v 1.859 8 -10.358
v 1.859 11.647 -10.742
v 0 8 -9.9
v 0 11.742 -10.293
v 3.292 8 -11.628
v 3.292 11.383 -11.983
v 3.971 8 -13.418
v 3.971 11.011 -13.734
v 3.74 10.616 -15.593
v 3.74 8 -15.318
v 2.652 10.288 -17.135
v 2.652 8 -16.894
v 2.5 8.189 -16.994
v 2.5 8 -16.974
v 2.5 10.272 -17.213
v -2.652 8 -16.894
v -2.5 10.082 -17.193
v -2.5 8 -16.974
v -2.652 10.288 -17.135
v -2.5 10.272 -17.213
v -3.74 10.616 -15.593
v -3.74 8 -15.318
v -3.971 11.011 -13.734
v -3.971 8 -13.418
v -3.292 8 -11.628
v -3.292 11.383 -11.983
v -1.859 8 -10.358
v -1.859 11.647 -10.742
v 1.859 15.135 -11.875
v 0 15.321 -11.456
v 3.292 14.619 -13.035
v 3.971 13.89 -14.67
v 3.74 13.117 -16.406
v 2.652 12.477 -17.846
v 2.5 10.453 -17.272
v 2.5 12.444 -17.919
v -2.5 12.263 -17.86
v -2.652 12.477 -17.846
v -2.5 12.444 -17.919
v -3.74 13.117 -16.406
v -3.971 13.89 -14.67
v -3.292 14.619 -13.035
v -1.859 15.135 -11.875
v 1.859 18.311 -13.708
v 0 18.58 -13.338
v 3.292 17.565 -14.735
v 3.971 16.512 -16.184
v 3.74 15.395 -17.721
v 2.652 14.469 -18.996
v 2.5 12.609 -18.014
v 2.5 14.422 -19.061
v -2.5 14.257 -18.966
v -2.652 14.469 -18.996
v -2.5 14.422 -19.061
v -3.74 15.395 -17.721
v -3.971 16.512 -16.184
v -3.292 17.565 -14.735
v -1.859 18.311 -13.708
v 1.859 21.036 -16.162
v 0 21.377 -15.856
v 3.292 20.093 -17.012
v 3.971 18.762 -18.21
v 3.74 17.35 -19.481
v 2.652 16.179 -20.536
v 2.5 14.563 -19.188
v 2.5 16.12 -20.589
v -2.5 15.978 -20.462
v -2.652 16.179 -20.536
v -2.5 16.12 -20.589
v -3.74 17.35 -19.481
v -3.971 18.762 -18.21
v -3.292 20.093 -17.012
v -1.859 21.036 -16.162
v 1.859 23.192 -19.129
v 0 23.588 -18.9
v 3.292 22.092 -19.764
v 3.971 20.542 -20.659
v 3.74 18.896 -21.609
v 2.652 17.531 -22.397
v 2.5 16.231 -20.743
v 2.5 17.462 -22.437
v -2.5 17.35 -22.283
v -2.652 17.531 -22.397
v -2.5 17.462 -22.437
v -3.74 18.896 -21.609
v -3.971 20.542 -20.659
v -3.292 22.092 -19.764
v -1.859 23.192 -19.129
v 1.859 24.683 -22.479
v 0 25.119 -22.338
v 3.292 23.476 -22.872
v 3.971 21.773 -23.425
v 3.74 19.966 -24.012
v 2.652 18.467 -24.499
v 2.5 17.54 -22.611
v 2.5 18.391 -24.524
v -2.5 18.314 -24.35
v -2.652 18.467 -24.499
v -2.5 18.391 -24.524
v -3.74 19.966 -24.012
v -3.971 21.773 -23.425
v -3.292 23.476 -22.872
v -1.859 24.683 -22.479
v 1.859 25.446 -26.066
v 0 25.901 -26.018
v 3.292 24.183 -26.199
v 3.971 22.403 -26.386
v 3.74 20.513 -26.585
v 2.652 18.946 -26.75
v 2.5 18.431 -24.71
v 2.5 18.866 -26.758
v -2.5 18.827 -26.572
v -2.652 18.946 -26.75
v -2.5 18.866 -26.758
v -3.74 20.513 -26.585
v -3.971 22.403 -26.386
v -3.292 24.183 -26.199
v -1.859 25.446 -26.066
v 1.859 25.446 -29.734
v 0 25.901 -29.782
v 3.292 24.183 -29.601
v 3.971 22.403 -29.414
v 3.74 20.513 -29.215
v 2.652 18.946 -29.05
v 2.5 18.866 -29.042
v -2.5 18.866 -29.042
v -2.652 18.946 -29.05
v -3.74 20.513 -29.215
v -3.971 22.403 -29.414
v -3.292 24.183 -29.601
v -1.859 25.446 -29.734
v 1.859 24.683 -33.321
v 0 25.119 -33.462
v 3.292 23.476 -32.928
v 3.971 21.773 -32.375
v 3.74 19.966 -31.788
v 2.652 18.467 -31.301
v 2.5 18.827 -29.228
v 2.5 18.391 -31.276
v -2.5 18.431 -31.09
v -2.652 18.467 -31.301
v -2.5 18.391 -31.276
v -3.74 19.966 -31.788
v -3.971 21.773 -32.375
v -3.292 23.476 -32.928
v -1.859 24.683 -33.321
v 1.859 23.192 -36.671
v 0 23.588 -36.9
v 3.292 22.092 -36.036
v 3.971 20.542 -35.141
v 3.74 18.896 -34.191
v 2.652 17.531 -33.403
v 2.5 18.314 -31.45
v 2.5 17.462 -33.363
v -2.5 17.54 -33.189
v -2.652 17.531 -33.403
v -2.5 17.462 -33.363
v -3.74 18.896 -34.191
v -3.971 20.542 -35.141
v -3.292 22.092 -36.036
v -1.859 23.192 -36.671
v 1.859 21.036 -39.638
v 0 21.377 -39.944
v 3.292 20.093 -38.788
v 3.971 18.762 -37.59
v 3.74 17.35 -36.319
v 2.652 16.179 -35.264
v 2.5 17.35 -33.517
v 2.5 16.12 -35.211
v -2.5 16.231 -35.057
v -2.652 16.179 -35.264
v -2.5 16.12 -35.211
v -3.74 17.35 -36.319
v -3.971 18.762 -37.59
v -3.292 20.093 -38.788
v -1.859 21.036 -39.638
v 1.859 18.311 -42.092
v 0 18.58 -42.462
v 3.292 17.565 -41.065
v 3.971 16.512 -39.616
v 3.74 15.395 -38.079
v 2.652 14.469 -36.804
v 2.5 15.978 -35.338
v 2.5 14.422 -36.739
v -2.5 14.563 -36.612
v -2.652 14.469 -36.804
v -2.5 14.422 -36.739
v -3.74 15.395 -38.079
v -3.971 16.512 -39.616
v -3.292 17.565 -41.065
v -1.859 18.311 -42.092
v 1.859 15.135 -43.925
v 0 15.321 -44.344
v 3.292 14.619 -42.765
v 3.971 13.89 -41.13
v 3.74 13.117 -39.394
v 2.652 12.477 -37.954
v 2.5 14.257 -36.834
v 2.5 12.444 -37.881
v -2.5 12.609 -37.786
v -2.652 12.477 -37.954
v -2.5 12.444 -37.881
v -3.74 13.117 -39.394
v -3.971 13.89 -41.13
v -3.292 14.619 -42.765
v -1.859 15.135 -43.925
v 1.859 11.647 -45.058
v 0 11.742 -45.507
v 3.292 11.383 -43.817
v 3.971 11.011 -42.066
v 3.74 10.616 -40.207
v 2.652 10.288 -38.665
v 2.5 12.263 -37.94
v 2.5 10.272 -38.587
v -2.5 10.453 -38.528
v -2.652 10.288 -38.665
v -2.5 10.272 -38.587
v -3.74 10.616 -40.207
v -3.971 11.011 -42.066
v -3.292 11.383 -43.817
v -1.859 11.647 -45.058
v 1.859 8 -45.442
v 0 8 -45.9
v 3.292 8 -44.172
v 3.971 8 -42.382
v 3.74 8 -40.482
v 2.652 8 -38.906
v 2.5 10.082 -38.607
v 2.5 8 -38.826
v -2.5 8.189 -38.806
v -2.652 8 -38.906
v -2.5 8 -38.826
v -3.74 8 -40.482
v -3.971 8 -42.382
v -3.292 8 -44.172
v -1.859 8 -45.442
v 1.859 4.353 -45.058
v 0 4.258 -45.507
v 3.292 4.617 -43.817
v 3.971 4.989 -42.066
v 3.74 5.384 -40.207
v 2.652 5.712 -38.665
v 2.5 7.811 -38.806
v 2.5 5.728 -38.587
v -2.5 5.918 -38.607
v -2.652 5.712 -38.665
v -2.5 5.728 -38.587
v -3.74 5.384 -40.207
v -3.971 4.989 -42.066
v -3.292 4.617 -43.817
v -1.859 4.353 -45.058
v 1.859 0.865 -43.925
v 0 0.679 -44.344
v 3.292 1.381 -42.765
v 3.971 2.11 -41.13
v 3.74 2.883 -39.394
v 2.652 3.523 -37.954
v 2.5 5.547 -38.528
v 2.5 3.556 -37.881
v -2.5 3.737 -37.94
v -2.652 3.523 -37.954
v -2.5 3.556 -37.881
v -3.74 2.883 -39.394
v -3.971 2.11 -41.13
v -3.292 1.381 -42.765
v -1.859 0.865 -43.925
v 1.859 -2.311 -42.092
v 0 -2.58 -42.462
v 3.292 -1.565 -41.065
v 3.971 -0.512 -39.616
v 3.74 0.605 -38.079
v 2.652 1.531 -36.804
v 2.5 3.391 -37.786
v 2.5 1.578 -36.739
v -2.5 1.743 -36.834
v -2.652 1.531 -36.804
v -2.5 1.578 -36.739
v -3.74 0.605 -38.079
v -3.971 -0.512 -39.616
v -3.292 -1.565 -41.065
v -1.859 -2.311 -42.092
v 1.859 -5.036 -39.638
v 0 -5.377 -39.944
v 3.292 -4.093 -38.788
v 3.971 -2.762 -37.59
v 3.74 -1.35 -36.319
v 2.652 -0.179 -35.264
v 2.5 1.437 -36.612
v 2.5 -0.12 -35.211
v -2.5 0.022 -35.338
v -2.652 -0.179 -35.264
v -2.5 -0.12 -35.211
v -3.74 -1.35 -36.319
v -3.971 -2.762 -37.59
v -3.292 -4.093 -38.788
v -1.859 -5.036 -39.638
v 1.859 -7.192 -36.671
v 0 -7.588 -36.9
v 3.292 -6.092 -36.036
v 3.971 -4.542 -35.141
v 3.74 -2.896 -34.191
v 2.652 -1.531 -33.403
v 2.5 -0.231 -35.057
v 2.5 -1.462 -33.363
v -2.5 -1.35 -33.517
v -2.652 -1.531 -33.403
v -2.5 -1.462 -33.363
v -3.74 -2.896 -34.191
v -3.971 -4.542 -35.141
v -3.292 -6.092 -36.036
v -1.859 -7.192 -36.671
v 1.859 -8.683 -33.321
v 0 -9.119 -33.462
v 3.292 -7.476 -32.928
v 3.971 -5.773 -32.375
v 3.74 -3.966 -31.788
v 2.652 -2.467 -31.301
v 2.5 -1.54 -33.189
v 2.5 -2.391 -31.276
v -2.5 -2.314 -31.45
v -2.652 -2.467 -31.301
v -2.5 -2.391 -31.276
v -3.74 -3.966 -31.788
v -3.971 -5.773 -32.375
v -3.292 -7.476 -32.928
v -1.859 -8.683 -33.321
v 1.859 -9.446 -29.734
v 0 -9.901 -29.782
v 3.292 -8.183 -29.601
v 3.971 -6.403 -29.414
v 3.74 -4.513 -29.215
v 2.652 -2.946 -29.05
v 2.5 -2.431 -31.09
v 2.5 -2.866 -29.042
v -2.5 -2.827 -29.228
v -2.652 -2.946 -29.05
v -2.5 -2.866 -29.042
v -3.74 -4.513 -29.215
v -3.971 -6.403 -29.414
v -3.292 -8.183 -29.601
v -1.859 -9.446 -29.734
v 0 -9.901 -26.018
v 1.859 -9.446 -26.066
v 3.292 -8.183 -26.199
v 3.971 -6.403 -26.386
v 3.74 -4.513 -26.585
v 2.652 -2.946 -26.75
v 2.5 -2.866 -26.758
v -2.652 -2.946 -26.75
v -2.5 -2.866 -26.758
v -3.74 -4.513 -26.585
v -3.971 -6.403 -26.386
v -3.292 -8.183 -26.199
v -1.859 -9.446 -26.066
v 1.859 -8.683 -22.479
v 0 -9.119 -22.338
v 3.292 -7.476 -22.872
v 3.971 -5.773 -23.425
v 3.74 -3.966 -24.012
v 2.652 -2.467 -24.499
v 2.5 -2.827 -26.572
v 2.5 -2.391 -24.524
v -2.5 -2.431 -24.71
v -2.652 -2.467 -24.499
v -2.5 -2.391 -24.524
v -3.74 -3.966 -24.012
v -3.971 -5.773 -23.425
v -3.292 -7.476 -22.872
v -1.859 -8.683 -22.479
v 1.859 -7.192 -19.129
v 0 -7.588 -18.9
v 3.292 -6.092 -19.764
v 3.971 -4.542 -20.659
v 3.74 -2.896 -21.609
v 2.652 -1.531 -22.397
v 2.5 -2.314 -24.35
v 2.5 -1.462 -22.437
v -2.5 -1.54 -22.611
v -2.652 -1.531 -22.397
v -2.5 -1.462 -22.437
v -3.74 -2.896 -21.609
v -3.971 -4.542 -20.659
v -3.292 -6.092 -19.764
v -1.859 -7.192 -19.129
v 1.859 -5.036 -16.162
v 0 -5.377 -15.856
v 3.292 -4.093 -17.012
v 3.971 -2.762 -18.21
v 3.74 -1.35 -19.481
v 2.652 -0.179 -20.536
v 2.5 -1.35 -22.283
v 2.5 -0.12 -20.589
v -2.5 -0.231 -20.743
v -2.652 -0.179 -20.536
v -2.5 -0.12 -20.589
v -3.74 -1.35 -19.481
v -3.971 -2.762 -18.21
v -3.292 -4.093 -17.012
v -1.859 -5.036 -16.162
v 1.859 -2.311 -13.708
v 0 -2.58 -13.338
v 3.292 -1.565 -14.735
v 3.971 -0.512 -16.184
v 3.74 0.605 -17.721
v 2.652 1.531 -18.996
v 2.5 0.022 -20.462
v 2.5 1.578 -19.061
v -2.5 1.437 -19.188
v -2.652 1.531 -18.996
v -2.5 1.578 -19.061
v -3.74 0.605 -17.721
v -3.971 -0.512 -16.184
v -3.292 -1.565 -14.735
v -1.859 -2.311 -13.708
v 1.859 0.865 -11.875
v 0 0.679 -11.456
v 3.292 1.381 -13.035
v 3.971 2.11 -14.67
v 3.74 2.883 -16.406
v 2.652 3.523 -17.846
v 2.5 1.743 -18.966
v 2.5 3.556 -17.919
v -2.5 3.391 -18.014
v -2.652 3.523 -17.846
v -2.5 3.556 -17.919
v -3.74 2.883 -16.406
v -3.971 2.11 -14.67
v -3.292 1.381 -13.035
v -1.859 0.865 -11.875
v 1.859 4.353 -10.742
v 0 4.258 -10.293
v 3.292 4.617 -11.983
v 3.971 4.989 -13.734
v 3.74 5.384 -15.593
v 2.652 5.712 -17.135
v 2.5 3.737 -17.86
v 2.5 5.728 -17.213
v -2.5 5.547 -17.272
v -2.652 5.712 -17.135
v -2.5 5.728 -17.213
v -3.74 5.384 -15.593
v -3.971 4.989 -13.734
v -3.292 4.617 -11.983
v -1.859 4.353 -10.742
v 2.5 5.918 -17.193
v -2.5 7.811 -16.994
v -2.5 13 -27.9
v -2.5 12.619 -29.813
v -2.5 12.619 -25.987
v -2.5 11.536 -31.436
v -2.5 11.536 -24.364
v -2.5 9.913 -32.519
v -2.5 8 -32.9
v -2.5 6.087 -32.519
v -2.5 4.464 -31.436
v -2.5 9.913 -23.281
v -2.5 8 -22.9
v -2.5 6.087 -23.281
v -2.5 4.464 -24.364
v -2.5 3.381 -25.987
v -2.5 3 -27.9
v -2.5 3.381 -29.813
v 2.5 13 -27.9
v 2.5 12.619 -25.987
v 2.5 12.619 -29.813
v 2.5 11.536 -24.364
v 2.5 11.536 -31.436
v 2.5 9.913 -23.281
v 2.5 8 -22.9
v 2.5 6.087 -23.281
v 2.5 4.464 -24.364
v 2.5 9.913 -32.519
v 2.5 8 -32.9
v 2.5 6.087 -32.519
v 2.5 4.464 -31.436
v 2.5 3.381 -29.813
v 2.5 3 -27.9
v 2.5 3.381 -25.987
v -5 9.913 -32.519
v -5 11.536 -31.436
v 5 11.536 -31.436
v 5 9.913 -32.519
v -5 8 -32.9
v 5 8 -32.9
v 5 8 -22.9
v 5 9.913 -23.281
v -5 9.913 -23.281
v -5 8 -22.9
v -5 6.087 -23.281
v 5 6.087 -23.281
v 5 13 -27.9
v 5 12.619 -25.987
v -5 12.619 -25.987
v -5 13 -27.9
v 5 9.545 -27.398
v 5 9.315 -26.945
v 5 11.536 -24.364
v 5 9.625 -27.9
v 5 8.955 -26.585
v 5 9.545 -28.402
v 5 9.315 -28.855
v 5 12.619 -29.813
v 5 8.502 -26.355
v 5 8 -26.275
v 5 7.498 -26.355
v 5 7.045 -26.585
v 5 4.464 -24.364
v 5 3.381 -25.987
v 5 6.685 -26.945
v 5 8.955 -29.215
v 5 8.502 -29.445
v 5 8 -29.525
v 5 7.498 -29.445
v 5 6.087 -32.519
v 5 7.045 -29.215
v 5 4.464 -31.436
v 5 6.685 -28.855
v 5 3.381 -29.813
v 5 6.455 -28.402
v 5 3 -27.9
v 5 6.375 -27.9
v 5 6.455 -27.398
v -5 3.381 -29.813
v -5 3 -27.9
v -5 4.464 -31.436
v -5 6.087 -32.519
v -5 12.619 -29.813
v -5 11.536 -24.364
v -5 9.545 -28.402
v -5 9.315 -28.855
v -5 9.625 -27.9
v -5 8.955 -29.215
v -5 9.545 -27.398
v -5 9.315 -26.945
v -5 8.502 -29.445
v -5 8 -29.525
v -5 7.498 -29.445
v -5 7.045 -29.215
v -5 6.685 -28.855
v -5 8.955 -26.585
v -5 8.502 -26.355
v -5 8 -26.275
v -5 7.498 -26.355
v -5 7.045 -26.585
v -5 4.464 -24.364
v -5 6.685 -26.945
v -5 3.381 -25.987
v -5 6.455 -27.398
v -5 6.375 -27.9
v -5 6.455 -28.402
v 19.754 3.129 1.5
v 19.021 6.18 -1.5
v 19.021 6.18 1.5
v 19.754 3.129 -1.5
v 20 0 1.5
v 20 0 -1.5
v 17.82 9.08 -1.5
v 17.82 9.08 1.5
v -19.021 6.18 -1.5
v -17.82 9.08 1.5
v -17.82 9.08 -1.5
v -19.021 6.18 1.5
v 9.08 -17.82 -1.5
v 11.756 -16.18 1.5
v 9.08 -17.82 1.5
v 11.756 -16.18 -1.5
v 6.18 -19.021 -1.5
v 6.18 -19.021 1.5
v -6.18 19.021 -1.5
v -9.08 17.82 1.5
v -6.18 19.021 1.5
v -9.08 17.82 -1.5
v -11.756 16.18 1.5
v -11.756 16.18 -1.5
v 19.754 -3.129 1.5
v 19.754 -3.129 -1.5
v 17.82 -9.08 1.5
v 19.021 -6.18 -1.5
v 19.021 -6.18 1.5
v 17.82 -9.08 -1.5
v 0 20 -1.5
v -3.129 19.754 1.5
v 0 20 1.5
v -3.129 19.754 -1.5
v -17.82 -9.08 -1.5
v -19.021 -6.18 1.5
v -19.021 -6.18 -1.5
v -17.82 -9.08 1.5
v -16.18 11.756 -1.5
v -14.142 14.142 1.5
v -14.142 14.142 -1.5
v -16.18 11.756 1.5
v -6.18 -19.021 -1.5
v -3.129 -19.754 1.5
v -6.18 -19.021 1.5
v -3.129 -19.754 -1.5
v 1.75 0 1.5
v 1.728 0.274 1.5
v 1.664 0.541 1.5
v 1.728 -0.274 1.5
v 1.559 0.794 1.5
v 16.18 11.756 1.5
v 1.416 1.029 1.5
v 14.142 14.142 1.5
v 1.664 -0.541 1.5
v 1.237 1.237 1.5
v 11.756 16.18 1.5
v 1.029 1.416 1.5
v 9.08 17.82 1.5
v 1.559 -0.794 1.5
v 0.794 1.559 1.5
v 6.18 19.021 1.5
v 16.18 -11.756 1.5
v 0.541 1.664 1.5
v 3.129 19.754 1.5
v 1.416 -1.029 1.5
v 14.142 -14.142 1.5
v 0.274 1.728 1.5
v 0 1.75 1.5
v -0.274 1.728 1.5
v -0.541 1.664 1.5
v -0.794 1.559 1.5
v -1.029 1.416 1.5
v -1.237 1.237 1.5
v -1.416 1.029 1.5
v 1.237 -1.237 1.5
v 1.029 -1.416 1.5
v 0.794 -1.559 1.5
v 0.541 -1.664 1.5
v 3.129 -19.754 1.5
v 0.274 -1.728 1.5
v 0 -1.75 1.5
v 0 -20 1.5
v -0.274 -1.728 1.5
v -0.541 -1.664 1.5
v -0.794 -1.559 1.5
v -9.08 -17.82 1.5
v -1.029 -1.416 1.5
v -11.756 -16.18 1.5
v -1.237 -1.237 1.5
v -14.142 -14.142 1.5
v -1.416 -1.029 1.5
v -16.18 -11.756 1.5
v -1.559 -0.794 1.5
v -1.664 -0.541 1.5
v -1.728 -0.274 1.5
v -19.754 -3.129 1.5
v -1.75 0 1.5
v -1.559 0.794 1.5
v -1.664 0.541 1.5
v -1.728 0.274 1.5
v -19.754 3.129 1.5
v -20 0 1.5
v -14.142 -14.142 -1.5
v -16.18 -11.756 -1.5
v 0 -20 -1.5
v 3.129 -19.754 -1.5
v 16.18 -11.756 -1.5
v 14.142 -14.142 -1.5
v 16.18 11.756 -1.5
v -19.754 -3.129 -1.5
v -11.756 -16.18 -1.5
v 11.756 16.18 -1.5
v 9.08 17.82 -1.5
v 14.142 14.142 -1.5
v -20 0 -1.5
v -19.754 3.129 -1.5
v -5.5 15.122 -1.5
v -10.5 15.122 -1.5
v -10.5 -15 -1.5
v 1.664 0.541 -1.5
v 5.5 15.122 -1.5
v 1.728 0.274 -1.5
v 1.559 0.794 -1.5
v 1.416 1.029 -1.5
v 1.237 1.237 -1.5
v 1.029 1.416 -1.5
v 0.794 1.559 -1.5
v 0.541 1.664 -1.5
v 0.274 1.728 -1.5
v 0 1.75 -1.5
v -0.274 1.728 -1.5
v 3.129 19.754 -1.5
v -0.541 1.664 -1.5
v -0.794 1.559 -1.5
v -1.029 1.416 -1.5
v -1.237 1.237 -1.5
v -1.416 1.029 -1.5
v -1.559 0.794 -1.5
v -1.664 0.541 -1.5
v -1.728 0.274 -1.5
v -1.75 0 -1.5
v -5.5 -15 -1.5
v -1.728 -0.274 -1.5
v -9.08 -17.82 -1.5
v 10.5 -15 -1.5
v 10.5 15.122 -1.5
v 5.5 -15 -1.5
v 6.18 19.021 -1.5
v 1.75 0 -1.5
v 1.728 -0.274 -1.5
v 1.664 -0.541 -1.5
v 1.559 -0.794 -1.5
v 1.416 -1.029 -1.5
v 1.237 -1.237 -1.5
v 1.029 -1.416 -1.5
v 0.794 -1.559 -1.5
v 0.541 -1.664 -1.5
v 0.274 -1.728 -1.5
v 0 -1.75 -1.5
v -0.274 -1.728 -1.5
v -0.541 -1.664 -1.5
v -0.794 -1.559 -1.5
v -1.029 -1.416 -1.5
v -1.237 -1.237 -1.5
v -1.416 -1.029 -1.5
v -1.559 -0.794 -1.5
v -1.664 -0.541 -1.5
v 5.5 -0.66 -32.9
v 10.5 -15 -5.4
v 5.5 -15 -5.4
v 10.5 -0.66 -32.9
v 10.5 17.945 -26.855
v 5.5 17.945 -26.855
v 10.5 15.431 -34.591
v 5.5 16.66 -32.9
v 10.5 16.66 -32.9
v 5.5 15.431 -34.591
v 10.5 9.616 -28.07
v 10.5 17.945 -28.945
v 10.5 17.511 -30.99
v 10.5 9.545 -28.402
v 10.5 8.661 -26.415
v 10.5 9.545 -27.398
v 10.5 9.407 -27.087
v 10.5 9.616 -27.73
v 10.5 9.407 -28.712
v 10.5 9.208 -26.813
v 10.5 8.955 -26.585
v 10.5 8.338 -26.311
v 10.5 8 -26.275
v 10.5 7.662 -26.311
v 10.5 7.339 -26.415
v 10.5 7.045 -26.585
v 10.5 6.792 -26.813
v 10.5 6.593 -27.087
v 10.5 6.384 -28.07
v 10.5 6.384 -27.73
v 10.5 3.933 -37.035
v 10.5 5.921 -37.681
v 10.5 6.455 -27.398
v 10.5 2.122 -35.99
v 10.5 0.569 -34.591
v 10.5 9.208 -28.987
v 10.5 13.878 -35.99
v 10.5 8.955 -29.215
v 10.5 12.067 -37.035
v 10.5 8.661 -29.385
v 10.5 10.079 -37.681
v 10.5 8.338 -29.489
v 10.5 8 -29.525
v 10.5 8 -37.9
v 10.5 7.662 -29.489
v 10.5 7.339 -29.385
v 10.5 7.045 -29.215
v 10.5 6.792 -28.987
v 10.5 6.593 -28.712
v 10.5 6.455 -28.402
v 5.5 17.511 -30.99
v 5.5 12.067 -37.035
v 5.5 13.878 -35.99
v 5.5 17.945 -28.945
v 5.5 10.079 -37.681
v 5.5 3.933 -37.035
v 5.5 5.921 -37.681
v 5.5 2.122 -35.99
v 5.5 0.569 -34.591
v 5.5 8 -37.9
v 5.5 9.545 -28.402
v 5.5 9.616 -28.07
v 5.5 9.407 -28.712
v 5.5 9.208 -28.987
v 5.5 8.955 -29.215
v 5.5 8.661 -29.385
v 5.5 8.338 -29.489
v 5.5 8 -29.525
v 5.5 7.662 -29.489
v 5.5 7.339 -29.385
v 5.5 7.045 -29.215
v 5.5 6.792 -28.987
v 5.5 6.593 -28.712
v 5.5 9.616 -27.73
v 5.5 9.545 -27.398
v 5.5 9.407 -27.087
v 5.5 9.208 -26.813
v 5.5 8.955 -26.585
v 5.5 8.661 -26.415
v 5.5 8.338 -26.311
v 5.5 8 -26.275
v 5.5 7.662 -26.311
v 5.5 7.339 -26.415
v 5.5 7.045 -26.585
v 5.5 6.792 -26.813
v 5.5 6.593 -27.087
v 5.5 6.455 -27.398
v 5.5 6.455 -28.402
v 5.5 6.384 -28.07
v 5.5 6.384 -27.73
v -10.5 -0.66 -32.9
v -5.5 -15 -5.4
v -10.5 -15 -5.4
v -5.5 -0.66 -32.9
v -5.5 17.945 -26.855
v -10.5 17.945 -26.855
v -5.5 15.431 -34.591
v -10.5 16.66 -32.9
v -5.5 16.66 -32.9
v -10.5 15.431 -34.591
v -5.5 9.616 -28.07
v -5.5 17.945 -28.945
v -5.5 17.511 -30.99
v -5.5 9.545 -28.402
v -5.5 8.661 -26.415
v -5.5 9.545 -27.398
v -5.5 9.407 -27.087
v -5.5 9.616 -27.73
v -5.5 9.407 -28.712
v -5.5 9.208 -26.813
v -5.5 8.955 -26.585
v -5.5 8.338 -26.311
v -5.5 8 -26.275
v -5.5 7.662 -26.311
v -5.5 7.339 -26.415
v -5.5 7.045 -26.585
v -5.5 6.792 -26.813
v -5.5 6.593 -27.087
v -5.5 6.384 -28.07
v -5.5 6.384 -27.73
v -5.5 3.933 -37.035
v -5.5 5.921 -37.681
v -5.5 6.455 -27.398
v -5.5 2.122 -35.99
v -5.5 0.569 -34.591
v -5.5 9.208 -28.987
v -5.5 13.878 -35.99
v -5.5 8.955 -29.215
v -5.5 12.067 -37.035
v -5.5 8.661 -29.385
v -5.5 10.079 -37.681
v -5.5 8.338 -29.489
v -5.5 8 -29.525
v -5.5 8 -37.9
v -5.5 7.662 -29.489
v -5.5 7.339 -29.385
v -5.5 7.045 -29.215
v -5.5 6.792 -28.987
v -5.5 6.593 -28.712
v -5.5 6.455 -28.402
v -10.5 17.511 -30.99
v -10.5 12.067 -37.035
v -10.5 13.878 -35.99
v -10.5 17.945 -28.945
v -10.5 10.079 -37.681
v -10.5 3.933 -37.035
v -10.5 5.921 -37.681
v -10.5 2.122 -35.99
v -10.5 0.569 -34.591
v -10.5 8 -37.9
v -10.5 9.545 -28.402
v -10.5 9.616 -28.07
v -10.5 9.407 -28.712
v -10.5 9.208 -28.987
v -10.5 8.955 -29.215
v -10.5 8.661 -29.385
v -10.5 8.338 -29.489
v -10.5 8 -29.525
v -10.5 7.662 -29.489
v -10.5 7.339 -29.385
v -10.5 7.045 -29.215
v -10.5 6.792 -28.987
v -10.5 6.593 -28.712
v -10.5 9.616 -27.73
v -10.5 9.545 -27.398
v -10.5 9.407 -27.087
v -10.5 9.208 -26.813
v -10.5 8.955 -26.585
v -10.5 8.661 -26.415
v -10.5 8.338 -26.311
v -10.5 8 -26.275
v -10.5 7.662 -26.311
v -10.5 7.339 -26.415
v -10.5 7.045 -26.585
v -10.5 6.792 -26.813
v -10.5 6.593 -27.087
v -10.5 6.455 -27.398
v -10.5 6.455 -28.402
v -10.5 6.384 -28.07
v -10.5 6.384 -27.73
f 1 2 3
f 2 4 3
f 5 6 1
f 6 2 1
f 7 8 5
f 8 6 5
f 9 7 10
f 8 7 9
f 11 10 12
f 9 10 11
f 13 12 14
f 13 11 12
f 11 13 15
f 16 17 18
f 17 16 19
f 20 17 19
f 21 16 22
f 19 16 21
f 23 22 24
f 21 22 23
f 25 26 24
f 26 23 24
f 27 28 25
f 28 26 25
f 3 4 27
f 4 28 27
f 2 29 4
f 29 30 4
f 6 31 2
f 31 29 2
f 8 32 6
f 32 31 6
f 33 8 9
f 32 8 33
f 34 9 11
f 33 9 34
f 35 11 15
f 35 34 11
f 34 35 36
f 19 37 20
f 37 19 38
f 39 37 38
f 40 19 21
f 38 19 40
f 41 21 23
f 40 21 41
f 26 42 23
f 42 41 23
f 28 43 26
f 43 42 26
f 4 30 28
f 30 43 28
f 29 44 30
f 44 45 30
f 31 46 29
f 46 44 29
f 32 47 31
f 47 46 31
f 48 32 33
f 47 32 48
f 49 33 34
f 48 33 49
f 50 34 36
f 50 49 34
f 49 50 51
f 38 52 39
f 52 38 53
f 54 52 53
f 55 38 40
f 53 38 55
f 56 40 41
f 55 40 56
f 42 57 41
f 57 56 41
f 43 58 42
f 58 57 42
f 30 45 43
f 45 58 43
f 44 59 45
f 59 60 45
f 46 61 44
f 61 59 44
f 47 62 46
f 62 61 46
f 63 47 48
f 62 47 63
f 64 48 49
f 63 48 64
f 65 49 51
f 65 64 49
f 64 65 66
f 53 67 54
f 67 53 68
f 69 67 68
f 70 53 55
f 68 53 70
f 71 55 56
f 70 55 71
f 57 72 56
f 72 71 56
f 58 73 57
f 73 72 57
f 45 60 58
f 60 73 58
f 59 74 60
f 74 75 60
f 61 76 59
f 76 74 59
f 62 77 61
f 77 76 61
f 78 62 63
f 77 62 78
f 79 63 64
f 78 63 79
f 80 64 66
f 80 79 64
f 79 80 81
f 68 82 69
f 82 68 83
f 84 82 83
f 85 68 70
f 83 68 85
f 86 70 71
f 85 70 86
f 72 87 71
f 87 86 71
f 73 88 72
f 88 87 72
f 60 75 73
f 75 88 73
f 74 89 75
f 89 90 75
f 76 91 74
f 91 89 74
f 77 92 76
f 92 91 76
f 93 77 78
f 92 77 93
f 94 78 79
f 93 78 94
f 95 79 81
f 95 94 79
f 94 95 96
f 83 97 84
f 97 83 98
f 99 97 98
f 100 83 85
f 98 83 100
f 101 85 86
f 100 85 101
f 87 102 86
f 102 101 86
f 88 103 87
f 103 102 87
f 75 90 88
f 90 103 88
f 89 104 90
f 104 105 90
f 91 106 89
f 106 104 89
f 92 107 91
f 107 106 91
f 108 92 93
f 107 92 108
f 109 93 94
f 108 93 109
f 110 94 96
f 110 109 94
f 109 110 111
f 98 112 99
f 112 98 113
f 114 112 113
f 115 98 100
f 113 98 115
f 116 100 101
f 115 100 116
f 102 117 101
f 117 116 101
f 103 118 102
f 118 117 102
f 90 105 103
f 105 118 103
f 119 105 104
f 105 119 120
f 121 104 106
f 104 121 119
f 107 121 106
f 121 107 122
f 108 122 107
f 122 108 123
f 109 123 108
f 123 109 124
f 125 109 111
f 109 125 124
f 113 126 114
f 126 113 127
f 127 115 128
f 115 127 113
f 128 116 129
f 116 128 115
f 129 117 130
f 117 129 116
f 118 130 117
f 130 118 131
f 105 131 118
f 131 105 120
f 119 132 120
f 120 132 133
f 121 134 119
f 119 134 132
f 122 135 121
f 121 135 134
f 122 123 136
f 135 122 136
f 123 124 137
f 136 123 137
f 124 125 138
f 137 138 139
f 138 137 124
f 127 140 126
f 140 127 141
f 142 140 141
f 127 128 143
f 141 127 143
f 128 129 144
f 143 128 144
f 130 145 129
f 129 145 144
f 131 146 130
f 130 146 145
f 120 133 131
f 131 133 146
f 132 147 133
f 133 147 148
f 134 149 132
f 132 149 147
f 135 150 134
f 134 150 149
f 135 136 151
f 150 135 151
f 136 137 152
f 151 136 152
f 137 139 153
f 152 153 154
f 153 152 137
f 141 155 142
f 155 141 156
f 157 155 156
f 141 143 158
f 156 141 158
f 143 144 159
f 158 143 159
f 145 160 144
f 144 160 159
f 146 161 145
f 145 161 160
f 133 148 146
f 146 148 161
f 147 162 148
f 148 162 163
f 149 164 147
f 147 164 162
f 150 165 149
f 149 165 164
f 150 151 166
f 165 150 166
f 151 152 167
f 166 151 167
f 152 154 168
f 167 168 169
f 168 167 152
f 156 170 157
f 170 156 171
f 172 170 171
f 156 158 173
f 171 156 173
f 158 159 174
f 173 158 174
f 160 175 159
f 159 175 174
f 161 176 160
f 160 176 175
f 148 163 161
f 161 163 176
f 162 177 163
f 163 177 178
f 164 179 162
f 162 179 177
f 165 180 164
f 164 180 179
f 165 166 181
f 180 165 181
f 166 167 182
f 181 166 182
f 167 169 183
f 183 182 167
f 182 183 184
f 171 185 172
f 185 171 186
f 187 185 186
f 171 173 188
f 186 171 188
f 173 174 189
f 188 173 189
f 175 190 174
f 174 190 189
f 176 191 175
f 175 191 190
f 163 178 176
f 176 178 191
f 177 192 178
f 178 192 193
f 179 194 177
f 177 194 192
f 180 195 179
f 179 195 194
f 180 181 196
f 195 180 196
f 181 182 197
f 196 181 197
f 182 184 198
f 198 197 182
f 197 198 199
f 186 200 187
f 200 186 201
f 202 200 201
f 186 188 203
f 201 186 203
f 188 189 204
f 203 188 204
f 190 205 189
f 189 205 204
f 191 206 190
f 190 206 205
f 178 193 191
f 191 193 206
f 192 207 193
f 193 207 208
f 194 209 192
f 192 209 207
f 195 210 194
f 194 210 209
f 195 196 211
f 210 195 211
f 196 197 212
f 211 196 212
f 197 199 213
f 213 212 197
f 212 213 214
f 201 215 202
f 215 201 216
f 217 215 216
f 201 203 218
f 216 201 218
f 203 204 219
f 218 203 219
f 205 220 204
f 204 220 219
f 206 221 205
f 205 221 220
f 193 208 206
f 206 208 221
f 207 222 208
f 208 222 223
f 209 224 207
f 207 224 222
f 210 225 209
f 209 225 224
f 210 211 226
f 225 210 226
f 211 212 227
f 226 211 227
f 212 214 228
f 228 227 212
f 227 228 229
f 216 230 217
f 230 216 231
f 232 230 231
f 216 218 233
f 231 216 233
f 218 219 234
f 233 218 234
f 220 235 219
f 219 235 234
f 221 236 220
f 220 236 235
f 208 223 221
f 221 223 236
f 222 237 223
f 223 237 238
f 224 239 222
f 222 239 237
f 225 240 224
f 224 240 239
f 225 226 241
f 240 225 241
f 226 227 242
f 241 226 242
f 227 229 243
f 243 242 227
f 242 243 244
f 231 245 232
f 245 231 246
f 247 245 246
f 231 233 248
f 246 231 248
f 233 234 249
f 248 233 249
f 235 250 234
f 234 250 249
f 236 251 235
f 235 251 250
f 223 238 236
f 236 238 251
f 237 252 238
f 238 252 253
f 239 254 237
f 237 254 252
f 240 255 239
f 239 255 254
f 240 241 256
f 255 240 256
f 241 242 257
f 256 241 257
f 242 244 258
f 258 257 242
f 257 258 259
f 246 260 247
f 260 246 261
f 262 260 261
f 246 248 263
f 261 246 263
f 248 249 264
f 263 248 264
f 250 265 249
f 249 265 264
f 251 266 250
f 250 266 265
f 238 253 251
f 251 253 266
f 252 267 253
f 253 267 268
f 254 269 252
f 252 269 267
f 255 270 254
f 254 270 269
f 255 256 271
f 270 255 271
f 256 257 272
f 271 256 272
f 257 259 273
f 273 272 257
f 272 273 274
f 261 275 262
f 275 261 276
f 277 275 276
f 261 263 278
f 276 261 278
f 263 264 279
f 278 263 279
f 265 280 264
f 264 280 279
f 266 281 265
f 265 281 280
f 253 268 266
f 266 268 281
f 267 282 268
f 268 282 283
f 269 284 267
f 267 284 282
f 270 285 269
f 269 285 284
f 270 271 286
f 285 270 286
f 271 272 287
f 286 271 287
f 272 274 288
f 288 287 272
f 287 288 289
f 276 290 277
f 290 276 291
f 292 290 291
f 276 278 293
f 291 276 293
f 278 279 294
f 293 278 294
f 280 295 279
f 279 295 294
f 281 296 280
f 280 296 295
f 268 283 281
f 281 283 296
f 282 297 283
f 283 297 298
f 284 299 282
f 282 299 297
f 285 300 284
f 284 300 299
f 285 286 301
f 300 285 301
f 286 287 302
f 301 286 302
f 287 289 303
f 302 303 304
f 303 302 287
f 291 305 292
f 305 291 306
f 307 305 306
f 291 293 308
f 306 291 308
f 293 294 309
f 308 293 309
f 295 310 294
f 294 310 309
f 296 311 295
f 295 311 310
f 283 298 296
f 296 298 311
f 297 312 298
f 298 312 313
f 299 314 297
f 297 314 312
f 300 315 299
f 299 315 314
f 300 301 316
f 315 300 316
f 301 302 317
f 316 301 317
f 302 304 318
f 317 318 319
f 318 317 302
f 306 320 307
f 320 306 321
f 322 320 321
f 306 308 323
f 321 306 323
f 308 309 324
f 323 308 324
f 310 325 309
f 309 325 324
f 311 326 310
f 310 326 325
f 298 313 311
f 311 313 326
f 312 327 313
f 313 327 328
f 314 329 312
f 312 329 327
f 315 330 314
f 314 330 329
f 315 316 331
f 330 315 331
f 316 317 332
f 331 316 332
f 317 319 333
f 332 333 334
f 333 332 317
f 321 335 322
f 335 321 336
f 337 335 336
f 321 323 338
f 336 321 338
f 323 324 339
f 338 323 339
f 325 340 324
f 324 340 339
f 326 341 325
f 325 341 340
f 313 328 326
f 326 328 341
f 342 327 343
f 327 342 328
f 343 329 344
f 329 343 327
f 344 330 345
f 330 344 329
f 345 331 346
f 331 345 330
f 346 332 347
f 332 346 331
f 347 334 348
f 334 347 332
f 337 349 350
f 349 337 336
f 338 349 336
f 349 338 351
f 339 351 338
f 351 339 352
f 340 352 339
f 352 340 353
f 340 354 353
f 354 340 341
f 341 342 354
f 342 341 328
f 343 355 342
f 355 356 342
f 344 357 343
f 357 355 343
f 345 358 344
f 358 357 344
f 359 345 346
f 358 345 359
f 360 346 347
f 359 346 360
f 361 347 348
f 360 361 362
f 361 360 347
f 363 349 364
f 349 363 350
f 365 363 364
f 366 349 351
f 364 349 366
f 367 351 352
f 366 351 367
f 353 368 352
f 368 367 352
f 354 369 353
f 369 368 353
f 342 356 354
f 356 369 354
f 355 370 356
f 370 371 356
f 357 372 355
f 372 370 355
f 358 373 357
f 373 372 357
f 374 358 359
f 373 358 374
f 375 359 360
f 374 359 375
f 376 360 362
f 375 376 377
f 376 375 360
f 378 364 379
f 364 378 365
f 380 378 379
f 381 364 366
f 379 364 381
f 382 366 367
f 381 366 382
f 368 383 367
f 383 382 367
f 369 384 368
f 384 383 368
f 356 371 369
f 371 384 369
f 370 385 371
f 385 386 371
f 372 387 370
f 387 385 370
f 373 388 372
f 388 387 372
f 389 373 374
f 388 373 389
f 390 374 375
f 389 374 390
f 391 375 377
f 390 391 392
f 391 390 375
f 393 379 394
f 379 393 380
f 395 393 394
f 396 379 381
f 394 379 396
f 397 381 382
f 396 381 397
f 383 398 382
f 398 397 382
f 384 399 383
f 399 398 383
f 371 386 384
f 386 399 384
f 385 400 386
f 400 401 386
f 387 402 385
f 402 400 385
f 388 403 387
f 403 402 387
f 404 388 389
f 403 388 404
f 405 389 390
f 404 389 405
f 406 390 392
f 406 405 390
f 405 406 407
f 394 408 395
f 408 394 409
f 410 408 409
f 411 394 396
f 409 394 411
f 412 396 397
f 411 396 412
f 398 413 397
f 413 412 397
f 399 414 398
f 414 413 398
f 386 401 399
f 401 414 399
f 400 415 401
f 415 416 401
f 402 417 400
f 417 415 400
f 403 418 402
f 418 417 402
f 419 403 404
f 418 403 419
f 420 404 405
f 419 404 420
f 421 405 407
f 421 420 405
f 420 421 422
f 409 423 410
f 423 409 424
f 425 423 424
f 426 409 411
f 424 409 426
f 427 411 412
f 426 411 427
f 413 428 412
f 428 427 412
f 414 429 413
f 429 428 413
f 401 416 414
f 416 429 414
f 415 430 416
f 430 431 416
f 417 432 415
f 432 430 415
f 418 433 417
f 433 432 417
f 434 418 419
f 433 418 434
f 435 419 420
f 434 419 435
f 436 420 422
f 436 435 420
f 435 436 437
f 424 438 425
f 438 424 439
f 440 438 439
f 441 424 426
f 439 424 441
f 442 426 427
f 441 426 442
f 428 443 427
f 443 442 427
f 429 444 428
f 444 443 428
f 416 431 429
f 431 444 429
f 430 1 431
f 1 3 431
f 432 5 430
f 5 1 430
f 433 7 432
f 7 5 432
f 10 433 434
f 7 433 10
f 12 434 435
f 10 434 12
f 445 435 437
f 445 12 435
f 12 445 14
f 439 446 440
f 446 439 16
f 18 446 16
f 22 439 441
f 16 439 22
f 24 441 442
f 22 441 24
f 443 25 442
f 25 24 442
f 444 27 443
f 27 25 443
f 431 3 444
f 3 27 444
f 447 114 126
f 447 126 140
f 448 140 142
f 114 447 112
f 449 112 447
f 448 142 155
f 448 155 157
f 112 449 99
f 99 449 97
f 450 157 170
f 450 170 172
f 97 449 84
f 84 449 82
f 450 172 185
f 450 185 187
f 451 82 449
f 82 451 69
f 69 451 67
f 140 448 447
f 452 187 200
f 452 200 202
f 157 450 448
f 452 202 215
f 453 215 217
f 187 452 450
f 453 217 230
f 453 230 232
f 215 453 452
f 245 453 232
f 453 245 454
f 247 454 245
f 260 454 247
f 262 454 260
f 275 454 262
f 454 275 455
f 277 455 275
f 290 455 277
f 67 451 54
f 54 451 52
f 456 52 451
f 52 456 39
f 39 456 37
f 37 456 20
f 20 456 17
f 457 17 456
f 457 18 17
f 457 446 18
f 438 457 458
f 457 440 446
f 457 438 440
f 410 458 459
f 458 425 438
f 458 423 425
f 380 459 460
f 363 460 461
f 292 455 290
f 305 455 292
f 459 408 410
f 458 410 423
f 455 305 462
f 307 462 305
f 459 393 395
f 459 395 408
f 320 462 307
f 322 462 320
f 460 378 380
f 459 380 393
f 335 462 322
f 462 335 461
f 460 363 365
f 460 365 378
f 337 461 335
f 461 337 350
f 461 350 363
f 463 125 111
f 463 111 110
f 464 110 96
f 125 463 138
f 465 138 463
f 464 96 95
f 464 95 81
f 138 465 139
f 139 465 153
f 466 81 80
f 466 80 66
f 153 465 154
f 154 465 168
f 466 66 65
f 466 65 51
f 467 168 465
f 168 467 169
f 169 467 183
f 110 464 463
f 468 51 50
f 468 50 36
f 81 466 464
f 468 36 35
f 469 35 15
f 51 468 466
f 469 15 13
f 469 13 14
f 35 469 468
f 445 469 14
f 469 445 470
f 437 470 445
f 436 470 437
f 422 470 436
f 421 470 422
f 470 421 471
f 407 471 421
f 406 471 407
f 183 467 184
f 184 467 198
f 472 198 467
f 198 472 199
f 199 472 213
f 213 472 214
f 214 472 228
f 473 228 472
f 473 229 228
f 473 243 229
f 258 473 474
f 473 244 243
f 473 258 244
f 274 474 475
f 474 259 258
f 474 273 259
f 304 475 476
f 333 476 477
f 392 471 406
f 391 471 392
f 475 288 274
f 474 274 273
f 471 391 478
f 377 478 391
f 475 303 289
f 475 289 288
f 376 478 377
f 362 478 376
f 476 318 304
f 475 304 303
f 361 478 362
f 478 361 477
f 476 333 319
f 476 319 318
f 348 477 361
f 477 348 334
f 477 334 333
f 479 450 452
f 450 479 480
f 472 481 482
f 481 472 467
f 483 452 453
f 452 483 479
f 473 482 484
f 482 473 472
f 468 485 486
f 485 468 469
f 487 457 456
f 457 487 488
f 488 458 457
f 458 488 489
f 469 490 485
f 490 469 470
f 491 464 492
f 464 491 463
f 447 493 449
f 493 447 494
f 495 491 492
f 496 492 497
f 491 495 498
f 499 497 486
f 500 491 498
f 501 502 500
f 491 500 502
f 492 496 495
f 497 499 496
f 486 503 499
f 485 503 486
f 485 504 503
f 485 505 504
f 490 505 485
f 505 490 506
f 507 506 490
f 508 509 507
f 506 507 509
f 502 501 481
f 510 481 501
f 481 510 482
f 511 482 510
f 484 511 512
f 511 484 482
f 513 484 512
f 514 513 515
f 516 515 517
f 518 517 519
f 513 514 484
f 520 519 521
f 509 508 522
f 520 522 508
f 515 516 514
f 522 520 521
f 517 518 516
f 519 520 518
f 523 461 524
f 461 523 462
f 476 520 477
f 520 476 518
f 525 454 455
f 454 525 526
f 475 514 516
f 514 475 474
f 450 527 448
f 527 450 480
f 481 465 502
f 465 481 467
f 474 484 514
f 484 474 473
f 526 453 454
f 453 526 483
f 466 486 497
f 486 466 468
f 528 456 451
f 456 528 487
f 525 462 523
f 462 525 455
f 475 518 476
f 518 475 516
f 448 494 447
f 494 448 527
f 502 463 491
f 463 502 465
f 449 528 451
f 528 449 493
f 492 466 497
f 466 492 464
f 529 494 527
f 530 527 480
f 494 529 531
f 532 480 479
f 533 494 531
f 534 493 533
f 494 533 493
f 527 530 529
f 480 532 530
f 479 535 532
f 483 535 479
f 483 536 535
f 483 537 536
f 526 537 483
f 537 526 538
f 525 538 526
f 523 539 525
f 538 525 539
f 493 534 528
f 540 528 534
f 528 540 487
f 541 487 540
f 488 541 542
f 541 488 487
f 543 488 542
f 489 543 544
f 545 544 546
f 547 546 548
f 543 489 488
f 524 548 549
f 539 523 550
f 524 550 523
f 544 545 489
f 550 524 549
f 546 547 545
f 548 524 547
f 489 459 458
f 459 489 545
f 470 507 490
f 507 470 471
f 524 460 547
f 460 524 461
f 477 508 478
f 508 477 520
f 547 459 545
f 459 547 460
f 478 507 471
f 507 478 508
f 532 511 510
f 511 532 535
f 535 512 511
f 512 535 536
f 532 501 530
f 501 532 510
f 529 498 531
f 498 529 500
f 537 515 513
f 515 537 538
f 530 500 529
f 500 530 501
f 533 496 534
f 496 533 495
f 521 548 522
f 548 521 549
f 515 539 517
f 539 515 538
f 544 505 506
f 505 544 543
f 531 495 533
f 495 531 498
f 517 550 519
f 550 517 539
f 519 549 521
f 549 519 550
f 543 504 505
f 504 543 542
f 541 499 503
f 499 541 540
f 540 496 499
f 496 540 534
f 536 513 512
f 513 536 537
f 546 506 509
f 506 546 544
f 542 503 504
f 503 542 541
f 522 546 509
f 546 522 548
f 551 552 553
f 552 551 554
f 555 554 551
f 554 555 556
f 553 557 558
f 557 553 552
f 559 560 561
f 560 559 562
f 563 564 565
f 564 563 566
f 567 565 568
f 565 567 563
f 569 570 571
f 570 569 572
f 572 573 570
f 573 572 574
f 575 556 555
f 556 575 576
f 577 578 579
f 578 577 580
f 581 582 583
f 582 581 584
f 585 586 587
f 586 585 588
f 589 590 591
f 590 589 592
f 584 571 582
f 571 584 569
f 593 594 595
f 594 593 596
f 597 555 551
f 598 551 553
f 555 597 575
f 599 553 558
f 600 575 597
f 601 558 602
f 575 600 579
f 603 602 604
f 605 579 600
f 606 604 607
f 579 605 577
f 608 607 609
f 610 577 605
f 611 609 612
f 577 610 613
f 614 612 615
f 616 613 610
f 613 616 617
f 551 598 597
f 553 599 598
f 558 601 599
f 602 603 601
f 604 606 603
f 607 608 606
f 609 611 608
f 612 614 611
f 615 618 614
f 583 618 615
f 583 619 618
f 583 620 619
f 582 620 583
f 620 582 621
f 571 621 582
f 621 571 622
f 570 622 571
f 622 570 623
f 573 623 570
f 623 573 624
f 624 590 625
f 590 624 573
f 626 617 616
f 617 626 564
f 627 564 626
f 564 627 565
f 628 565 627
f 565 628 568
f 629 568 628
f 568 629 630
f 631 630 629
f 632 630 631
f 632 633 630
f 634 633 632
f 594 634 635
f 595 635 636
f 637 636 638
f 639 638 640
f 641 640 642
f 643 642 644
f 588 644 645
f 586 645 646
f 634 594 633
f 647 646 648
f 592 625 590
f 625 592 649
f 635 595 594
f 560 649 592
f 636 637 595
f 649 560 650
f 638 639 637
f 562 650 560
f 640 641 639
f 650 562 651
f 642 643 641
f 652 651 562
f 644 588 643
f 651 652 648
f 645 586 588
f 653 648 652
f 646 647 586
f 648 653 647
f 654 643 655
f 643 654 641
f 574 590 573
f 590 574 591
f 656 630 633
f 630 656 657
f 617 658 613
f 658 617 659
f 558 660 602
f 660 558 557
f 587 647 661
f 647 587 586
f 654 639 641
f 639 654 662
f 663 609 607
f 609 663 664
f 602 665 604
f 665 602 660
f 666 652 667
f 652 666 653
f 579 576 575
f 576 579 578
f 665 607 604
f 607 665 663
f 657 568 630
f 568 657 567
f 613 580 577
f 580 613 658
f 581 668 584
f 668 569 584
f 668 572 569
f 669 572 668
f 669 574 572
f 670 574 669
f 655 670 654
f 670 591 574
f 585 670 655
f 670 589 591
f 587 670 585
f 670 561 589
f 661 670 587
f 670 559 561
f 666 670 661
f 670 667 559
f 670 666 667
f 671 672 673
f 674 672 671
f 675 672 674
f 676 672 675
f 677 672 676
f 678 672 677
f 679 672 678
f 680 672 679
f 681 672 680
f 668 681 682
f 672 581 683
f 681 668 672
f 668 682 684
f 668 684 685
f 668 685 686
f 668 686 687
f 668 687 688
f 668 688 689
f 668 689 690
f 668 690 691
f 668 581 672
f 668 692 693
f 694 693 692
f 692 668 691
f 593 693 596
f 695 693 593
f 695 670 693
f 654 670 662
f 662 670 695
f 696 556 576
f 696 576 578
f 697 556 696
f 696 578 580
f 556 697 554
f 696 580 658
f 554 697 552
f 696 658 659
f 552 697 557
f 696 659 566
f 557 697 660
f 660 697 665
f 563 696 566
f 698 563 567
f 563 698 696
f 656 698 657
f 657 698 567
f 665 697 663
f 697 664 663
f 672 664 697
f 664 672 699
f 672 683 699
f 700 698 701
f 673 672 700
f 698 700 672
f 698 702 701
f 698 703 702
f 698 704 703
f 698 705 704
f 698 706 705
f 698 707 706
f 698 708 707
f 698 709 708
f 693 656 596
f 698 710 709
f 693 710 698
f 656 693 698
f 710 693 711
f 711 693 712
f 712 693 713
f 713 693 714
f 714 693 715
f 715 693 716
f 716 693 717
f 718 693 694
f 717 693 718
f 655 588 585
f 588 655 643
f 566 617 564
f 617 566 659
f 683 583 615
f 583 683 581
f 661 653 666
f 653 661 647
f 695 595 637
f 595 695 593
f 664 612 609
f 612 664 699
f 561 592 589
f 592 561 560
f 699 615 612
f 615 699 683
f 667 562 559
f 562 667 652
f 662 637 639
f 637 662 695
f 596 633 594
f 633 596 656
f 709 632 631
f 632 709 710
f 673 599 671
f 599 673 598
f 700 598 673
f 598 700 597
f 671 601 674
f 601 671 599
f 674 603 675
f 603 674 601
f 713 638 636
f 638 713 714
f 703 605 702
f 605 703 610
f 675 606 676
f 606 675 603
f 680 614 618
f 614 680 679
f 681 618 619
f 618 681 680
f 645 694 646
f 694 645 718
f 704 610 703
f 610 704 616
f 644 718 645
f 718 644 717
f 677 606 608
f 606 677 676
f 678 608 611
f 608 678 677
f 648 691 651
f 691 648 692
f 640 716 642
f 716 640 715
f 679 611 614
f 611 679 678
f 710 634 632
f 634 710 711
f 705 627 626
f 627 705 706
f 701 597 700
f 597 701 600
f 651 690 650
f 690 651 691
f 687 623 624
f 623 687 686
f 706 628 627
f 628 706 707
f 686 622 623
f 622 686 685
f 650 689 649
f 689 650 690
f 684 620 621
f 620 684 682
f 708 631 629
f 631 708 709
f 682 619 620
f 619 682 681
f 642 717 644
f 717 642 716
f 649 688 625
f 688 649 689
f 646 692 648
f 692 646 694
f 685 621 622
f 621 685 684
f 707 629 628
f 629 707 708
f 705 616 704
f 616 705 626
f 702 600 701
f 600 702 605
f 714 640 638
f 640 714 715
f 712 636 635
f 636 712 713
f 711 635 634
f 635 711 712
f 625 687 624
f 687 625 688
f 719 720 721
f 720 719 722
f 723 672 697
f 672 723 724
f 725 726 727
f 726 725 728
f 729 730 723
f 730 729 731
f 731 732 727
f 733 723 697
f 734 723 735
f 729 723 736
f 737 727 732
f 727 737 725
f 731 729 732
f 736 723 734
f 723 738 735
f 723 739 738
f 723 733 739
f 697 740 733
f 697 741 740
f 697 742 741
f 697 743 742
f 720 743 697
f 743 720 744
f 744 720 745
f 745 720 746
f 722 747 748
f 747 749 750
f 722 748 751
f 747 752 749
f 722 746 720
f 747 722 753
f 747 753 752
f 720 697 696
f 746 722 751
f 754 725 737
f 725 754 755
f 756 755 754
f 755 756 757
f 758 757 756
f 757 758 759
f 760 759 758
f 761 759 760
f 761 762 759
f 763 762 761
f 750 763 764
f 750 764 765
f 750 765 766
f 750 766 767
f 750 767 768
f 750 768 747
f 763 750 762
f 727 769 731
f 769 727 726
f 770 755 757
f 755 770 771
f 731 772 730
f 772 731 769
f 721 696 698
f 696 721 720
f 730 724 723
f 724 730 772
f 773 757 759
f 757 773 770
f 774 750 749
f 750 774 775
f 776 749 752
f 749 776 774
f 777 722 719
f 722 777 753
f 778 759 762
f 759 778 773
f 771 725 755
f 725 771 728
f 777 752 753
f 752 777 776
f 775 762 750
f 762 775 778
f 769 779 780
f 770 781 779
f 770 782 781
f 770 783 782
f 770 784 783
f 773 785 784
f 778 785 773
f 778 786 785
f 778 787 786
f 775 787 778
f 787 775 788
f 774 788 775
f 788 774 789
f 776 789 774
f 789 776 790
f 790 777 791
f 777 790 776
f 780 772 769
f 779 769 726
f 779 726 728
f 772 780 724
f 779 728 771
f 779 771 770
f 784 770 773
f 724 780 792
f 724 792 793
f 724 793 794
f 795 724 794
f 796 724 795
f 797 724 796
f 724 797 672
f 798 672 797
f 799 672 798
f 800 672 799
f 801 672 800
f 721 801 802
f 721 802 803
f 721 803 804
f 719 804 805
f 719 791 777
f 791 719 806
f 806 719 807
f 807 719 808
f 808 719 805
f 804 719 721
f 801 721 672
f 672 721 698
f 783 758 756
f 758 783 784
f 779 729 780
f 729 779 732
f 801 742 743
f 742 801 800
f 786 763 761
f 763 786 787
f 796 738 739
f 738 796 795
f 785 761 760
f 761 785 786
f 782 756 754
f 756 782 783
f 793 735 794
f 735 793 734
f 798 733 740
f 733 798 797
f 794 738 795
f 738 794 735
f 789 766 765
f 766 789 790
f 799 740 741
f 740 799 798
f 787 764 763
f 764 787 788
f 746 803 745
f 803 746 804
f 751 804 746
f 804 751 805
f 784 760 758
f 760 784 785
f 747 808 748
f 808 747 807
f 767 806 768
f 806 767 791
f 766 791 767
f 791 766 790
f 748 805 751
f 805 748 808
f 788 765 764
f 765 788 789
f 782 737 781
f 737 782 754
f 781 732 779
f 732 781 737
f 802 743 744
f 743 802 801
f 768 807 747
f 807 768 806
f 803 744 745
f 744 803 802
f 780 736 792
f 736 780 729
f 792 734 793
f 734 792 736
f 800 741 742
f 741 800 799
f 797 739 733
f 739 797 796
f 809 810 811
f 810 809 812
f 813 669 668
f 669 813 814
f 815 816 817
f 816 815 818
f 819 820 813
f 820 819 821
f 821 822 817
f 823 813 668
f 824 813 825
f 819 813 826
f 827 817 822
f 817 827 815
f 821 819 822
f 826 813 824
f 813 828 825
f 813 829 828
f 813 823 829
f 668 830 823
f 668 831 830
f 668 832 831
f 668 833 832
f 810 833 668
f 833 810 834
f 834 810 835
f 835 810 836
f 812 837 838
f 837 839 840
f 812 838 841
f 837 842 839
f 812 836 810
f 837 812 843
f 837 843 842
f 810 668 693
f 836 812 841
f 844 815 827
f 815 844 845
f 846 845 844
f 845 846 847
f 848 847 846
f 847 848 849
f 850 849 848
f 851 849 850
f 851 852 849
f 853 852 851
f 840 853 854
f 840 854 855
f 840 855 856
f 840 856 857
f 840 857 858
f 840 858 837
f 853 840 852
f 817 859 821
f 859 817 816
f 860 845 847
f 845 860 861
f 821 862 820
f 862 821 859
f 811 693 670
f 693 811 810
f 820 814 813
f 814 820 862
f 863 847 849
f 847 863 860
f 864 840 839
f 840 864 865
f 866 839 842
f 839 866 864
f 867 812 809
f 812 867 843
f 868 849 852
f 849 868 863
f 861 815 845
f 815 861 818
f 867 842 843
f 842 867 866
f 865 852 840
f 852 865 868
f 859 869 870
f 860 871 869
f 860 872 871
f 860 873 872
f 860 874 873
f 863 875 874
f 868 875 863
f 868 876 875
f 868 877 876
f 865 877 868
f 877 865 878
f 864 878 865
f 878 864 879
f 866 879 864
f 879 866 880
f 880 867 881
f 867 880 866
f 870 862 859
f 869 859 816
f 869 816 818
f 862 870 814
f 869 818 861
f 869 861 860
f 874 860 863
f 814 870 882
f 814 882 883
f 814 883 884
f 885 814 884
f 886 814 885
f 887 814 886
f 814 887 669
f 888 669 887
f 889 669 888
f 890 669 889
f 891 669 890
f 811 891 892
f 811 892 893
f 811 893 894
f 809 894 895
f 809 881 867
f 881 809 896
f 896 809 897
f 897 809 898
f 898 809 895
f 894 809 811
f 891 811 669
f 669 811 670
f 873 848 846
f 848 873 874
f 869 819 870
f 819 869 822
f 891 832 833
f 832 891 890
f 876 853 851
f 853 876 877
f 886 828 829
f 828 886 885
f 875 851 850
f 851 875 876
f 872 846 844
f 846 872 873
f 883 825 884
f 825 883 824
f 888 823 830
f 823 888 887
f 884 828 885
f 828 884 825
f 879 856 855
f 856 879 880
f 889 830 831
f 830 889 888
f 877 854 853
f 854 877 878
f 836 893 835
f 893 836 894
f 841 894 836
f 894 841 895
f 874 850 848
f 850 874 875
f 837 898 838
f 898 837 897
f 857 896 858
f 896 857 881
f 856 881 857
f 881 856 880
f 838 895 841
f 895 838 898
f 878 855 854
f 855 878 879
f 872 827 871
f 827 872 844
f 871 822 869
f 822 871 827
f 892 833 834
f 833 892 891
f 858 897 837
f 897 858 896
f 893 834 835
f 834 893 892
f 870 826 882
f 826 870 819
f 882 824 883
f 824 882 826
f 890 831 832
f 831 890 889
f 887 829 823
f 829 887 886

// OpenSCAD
//NOT USED RIGHT NOW!!! FIX ME!!!! WHY IS THIS DIRTY AF?
handle_width = 10;
handle_depth = 5;
handle_height = 25;

base_height = 3;


back_draft = 8;

//module to create one entire handle of the finished model.
module handle() {
    difference() {
        hull() {
            cube([5, 30, 5], center=true);
            translate([0,back_draft,-handle_height])
                rotate([0,90,0])
                    cylinder(d = 20, h = 5, center=true);
        };
        translate([-5,back_draft,-handle_height])
            rotate([0,90,0])
                cylinder(d=3.25, h=10, $fn=30);
    }
}

//mesh of the wheel.
//try to do as little friction on the ground as possible.
translate([0,back_draft,-handle_height - base_height + 0.1])
    rotate([0,90,0])
        difference(){
            union(){
                rotate_extrude(){
                    translate([14,0,0])
                        circle(r=4);
                };
                cylinder(r=16, h=5, center=true, $fn=20);
                cylinder(r=5, h = 10, center=true);
            }
            cylinder(d=3.25, h=20, center=true, $fn=20);
        }

//hole for fixing to z-axis.
difference(){
    cylinder(d=40, h=base_height, center=true, $fn=40);
    cylinder(d=3.5, h=20, center=true, $fn=40);
}

//left handle
translate([8,0,-base_height + 0.1])
    handle();

//right handle
translate([-8,0,-base_height + 0.1])
    handle();
